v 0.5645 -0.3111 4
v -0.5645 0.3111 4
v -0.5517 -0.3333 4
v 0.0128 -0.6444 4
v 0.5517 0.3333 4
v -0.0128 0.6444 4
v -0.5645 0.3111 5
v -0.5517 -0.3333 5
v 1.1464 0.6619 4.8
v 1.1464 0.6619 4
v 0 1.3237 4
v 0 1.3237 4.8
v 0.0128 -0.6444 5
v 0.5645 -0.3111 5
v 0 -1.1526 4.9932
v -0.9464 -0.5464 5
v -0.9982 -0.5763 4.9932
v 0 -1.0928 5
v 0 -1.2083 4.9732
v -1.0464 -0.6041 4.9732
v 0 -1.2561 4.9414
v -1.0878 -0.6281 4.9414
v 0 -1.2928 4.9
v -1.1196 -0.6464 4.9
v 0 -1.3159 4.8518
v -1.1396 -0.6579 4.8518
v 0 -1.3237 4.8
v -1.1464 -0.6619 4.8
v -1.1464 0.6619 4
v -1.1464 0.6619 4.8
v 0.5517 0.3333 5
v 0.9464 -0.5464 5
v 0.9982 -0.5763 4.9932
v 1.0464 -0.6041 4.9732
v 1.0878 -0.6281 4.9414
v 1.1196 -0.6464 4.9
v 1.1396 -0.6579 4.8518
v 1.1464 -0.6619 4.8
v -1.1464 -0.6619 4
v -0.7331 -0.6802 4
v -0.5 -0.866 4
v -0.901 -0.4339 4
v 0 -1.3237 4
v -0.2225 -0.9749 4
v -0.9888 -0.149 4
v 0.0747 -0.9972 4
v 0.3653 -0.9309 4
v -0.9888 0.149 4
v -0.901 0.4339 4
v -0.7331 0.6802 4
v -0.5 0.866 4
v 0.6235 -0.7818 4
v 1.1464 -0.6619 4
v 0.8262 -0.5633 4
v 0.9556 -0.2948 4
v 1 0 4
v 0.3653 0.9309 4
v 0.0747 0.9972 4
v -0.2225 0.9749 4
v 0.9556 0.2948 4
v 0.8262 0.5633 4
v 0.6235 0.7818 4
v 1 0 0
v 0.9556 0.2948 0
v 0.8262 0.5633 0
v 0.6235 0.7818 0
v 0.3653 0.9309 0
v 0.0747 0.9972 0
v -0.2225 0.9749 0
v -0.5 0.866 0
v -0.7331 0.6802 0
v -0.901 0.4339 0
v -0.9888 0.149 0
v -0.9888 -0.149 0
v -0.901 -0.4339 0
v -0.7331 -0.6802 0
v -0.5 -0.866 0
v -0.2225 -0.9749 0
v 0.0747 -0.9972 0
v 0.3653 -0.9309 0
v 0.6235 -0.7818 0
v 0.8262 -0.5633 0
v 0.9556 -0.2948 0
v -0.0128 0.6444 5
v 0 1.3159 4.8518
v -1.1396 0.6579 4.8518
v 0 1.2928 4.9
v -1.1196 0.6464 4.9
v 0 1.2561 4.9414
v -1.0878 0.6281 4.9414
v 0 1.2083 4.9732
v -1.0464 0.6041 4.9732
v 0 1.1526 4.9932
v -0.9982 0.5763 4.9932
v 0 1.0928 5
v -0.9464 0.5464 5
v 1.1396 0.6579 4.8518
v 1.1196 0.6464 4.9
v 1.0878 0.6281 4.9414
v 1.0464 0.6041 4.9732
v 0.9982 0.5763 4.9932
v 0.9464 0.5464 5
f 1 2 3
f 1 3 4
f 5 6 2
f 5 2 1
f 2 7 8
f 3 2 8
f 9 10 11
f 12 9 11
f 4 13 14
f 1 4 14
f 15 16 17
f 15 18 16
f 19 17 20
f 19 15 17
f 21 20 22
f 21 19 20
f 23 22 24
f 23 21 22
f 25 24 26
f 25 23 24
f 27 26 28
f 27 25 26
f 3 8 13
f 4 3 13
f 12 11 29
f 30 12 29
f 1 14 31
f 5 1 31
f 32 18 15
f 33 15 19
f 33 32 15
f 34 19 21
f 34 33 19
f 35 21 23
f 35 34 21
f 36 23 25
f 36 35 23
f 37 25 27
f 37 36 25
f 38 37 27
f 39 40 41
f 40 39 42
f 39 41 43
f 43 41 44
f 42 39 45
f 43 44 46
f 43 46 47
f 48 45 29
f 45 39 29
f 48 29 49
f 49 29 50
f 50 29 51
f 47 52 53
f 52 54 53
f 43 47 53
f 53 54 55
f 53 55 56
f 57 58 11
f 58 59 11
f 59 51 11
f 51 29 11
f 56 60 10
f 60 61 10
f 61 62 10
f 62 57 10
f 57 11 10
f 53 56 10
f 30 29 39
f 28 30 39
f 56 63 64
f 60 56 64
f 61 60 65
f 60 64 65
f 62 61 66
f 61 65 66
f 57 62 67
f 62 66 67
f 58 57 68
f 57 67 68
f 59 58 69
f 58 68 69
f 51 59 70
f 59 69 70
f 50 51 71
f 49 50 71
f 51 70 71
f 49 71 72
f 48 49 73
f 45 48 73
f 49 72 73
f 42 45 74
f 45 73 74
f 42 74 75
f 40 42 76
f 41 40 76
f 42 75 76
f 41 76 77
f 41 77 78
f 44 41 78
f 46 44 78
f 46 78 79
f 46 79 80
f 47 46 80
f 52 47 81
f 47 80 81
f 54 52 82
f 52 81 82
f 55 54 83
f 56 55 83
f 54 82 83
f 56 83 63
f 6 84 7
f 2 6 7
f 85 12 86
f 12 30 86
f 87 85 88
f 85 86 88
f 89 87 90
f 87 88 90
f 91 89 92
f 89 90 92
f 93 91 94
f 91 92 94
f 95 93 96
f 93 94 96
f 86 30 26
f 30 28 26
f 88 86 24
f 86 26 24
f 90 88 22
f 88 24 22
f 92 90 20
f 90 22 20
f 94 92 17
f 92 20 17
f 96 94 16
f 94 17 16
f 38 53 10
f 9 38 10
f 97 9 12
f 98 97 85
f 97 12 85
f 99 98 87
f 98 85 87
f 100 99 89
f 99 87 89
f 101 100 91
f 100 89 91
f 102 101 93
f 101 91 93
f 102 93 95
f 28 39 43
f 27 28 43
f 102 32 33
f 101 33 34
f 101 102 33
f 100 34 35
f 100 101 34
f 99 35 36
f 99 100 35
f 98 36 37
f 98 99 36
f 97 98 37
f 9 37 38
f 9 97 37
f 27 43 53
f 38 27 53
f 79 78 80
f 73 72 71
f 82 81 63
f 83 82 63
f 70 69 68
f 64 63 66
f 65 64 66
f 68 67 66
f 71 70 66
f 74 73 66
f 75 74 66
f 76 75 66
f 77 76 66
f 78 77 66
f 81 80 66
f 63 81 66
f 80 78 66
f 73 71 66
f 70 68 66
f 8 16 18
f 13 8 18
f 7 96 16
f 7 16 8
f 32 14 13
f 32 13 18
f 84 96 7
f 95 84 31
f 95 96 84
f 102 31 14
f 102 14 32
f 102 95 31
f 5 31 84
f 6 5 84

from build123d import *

# Parameters (mm, degrees)
SKETCH1_R           = 1
BOSS_EXTRUDE1_DEPTH = 4
BOSS_EXTRUDE2_DEPTH = 1
CUT_EXTRUDE1_DEPTH  = 1
FILLET1_R           = 0.2


with BuildPart() as part:
    # Sketch1 → Boss-Extrude1 (new body)
    with BuildSketch(Plane.XY):
        Circle(SKETCH1_R)
    extrude(amount=BOSS_EXTRUDE1_DEPTH)

    # Sketch2 → Boss-Extrude2 (add)
    with BuildSketch(Plane.XY.offset(4)):
        Polygon((0, 1.323749562), (-1.146400749, 0.661874781), (-1.146400749, -0.661874781), (0, -1.323749562), (1.146400749, -0.661874781), (1.146400749, 0.661874781), align=None)
    extrude(amount=BOSS_EXTRUDE2_DEPTH)

    # Sketch3 → Cut-Extrude1 (cut)
    with BuildSketch(Plane.XY.offset(5)):
        Polygon((-0.56445286, 0.311116839), (-0.551661517, -0.333272096), (0.012791344, -0.644388936), (0.56445286, -0.311116839), (0.551661517, 0.333272096), (-0.012791344, 0.644388936), align=None)
    extrude(amount=-CUT_EXTRUDE1_DEPTH, mode=Mode.SUBTRACT)

    # Fillet1
    fillet1_edges = [part.edges().sort_by_distance(p)[0] for p in [
        (0.573200374, 0.992812171, 5),
        (-0.573200374, 0.992812171, 5),
        (-1.146400749, 0, 5),
        (-0.573200374, -0.992812171, 5),
        (0.573200374, -0.992812171, 5),
        (1.146400749, 0, 5),
    ]]
    fillet(fillet1_edges, radius=FILLET1_R)


solid = part.part
